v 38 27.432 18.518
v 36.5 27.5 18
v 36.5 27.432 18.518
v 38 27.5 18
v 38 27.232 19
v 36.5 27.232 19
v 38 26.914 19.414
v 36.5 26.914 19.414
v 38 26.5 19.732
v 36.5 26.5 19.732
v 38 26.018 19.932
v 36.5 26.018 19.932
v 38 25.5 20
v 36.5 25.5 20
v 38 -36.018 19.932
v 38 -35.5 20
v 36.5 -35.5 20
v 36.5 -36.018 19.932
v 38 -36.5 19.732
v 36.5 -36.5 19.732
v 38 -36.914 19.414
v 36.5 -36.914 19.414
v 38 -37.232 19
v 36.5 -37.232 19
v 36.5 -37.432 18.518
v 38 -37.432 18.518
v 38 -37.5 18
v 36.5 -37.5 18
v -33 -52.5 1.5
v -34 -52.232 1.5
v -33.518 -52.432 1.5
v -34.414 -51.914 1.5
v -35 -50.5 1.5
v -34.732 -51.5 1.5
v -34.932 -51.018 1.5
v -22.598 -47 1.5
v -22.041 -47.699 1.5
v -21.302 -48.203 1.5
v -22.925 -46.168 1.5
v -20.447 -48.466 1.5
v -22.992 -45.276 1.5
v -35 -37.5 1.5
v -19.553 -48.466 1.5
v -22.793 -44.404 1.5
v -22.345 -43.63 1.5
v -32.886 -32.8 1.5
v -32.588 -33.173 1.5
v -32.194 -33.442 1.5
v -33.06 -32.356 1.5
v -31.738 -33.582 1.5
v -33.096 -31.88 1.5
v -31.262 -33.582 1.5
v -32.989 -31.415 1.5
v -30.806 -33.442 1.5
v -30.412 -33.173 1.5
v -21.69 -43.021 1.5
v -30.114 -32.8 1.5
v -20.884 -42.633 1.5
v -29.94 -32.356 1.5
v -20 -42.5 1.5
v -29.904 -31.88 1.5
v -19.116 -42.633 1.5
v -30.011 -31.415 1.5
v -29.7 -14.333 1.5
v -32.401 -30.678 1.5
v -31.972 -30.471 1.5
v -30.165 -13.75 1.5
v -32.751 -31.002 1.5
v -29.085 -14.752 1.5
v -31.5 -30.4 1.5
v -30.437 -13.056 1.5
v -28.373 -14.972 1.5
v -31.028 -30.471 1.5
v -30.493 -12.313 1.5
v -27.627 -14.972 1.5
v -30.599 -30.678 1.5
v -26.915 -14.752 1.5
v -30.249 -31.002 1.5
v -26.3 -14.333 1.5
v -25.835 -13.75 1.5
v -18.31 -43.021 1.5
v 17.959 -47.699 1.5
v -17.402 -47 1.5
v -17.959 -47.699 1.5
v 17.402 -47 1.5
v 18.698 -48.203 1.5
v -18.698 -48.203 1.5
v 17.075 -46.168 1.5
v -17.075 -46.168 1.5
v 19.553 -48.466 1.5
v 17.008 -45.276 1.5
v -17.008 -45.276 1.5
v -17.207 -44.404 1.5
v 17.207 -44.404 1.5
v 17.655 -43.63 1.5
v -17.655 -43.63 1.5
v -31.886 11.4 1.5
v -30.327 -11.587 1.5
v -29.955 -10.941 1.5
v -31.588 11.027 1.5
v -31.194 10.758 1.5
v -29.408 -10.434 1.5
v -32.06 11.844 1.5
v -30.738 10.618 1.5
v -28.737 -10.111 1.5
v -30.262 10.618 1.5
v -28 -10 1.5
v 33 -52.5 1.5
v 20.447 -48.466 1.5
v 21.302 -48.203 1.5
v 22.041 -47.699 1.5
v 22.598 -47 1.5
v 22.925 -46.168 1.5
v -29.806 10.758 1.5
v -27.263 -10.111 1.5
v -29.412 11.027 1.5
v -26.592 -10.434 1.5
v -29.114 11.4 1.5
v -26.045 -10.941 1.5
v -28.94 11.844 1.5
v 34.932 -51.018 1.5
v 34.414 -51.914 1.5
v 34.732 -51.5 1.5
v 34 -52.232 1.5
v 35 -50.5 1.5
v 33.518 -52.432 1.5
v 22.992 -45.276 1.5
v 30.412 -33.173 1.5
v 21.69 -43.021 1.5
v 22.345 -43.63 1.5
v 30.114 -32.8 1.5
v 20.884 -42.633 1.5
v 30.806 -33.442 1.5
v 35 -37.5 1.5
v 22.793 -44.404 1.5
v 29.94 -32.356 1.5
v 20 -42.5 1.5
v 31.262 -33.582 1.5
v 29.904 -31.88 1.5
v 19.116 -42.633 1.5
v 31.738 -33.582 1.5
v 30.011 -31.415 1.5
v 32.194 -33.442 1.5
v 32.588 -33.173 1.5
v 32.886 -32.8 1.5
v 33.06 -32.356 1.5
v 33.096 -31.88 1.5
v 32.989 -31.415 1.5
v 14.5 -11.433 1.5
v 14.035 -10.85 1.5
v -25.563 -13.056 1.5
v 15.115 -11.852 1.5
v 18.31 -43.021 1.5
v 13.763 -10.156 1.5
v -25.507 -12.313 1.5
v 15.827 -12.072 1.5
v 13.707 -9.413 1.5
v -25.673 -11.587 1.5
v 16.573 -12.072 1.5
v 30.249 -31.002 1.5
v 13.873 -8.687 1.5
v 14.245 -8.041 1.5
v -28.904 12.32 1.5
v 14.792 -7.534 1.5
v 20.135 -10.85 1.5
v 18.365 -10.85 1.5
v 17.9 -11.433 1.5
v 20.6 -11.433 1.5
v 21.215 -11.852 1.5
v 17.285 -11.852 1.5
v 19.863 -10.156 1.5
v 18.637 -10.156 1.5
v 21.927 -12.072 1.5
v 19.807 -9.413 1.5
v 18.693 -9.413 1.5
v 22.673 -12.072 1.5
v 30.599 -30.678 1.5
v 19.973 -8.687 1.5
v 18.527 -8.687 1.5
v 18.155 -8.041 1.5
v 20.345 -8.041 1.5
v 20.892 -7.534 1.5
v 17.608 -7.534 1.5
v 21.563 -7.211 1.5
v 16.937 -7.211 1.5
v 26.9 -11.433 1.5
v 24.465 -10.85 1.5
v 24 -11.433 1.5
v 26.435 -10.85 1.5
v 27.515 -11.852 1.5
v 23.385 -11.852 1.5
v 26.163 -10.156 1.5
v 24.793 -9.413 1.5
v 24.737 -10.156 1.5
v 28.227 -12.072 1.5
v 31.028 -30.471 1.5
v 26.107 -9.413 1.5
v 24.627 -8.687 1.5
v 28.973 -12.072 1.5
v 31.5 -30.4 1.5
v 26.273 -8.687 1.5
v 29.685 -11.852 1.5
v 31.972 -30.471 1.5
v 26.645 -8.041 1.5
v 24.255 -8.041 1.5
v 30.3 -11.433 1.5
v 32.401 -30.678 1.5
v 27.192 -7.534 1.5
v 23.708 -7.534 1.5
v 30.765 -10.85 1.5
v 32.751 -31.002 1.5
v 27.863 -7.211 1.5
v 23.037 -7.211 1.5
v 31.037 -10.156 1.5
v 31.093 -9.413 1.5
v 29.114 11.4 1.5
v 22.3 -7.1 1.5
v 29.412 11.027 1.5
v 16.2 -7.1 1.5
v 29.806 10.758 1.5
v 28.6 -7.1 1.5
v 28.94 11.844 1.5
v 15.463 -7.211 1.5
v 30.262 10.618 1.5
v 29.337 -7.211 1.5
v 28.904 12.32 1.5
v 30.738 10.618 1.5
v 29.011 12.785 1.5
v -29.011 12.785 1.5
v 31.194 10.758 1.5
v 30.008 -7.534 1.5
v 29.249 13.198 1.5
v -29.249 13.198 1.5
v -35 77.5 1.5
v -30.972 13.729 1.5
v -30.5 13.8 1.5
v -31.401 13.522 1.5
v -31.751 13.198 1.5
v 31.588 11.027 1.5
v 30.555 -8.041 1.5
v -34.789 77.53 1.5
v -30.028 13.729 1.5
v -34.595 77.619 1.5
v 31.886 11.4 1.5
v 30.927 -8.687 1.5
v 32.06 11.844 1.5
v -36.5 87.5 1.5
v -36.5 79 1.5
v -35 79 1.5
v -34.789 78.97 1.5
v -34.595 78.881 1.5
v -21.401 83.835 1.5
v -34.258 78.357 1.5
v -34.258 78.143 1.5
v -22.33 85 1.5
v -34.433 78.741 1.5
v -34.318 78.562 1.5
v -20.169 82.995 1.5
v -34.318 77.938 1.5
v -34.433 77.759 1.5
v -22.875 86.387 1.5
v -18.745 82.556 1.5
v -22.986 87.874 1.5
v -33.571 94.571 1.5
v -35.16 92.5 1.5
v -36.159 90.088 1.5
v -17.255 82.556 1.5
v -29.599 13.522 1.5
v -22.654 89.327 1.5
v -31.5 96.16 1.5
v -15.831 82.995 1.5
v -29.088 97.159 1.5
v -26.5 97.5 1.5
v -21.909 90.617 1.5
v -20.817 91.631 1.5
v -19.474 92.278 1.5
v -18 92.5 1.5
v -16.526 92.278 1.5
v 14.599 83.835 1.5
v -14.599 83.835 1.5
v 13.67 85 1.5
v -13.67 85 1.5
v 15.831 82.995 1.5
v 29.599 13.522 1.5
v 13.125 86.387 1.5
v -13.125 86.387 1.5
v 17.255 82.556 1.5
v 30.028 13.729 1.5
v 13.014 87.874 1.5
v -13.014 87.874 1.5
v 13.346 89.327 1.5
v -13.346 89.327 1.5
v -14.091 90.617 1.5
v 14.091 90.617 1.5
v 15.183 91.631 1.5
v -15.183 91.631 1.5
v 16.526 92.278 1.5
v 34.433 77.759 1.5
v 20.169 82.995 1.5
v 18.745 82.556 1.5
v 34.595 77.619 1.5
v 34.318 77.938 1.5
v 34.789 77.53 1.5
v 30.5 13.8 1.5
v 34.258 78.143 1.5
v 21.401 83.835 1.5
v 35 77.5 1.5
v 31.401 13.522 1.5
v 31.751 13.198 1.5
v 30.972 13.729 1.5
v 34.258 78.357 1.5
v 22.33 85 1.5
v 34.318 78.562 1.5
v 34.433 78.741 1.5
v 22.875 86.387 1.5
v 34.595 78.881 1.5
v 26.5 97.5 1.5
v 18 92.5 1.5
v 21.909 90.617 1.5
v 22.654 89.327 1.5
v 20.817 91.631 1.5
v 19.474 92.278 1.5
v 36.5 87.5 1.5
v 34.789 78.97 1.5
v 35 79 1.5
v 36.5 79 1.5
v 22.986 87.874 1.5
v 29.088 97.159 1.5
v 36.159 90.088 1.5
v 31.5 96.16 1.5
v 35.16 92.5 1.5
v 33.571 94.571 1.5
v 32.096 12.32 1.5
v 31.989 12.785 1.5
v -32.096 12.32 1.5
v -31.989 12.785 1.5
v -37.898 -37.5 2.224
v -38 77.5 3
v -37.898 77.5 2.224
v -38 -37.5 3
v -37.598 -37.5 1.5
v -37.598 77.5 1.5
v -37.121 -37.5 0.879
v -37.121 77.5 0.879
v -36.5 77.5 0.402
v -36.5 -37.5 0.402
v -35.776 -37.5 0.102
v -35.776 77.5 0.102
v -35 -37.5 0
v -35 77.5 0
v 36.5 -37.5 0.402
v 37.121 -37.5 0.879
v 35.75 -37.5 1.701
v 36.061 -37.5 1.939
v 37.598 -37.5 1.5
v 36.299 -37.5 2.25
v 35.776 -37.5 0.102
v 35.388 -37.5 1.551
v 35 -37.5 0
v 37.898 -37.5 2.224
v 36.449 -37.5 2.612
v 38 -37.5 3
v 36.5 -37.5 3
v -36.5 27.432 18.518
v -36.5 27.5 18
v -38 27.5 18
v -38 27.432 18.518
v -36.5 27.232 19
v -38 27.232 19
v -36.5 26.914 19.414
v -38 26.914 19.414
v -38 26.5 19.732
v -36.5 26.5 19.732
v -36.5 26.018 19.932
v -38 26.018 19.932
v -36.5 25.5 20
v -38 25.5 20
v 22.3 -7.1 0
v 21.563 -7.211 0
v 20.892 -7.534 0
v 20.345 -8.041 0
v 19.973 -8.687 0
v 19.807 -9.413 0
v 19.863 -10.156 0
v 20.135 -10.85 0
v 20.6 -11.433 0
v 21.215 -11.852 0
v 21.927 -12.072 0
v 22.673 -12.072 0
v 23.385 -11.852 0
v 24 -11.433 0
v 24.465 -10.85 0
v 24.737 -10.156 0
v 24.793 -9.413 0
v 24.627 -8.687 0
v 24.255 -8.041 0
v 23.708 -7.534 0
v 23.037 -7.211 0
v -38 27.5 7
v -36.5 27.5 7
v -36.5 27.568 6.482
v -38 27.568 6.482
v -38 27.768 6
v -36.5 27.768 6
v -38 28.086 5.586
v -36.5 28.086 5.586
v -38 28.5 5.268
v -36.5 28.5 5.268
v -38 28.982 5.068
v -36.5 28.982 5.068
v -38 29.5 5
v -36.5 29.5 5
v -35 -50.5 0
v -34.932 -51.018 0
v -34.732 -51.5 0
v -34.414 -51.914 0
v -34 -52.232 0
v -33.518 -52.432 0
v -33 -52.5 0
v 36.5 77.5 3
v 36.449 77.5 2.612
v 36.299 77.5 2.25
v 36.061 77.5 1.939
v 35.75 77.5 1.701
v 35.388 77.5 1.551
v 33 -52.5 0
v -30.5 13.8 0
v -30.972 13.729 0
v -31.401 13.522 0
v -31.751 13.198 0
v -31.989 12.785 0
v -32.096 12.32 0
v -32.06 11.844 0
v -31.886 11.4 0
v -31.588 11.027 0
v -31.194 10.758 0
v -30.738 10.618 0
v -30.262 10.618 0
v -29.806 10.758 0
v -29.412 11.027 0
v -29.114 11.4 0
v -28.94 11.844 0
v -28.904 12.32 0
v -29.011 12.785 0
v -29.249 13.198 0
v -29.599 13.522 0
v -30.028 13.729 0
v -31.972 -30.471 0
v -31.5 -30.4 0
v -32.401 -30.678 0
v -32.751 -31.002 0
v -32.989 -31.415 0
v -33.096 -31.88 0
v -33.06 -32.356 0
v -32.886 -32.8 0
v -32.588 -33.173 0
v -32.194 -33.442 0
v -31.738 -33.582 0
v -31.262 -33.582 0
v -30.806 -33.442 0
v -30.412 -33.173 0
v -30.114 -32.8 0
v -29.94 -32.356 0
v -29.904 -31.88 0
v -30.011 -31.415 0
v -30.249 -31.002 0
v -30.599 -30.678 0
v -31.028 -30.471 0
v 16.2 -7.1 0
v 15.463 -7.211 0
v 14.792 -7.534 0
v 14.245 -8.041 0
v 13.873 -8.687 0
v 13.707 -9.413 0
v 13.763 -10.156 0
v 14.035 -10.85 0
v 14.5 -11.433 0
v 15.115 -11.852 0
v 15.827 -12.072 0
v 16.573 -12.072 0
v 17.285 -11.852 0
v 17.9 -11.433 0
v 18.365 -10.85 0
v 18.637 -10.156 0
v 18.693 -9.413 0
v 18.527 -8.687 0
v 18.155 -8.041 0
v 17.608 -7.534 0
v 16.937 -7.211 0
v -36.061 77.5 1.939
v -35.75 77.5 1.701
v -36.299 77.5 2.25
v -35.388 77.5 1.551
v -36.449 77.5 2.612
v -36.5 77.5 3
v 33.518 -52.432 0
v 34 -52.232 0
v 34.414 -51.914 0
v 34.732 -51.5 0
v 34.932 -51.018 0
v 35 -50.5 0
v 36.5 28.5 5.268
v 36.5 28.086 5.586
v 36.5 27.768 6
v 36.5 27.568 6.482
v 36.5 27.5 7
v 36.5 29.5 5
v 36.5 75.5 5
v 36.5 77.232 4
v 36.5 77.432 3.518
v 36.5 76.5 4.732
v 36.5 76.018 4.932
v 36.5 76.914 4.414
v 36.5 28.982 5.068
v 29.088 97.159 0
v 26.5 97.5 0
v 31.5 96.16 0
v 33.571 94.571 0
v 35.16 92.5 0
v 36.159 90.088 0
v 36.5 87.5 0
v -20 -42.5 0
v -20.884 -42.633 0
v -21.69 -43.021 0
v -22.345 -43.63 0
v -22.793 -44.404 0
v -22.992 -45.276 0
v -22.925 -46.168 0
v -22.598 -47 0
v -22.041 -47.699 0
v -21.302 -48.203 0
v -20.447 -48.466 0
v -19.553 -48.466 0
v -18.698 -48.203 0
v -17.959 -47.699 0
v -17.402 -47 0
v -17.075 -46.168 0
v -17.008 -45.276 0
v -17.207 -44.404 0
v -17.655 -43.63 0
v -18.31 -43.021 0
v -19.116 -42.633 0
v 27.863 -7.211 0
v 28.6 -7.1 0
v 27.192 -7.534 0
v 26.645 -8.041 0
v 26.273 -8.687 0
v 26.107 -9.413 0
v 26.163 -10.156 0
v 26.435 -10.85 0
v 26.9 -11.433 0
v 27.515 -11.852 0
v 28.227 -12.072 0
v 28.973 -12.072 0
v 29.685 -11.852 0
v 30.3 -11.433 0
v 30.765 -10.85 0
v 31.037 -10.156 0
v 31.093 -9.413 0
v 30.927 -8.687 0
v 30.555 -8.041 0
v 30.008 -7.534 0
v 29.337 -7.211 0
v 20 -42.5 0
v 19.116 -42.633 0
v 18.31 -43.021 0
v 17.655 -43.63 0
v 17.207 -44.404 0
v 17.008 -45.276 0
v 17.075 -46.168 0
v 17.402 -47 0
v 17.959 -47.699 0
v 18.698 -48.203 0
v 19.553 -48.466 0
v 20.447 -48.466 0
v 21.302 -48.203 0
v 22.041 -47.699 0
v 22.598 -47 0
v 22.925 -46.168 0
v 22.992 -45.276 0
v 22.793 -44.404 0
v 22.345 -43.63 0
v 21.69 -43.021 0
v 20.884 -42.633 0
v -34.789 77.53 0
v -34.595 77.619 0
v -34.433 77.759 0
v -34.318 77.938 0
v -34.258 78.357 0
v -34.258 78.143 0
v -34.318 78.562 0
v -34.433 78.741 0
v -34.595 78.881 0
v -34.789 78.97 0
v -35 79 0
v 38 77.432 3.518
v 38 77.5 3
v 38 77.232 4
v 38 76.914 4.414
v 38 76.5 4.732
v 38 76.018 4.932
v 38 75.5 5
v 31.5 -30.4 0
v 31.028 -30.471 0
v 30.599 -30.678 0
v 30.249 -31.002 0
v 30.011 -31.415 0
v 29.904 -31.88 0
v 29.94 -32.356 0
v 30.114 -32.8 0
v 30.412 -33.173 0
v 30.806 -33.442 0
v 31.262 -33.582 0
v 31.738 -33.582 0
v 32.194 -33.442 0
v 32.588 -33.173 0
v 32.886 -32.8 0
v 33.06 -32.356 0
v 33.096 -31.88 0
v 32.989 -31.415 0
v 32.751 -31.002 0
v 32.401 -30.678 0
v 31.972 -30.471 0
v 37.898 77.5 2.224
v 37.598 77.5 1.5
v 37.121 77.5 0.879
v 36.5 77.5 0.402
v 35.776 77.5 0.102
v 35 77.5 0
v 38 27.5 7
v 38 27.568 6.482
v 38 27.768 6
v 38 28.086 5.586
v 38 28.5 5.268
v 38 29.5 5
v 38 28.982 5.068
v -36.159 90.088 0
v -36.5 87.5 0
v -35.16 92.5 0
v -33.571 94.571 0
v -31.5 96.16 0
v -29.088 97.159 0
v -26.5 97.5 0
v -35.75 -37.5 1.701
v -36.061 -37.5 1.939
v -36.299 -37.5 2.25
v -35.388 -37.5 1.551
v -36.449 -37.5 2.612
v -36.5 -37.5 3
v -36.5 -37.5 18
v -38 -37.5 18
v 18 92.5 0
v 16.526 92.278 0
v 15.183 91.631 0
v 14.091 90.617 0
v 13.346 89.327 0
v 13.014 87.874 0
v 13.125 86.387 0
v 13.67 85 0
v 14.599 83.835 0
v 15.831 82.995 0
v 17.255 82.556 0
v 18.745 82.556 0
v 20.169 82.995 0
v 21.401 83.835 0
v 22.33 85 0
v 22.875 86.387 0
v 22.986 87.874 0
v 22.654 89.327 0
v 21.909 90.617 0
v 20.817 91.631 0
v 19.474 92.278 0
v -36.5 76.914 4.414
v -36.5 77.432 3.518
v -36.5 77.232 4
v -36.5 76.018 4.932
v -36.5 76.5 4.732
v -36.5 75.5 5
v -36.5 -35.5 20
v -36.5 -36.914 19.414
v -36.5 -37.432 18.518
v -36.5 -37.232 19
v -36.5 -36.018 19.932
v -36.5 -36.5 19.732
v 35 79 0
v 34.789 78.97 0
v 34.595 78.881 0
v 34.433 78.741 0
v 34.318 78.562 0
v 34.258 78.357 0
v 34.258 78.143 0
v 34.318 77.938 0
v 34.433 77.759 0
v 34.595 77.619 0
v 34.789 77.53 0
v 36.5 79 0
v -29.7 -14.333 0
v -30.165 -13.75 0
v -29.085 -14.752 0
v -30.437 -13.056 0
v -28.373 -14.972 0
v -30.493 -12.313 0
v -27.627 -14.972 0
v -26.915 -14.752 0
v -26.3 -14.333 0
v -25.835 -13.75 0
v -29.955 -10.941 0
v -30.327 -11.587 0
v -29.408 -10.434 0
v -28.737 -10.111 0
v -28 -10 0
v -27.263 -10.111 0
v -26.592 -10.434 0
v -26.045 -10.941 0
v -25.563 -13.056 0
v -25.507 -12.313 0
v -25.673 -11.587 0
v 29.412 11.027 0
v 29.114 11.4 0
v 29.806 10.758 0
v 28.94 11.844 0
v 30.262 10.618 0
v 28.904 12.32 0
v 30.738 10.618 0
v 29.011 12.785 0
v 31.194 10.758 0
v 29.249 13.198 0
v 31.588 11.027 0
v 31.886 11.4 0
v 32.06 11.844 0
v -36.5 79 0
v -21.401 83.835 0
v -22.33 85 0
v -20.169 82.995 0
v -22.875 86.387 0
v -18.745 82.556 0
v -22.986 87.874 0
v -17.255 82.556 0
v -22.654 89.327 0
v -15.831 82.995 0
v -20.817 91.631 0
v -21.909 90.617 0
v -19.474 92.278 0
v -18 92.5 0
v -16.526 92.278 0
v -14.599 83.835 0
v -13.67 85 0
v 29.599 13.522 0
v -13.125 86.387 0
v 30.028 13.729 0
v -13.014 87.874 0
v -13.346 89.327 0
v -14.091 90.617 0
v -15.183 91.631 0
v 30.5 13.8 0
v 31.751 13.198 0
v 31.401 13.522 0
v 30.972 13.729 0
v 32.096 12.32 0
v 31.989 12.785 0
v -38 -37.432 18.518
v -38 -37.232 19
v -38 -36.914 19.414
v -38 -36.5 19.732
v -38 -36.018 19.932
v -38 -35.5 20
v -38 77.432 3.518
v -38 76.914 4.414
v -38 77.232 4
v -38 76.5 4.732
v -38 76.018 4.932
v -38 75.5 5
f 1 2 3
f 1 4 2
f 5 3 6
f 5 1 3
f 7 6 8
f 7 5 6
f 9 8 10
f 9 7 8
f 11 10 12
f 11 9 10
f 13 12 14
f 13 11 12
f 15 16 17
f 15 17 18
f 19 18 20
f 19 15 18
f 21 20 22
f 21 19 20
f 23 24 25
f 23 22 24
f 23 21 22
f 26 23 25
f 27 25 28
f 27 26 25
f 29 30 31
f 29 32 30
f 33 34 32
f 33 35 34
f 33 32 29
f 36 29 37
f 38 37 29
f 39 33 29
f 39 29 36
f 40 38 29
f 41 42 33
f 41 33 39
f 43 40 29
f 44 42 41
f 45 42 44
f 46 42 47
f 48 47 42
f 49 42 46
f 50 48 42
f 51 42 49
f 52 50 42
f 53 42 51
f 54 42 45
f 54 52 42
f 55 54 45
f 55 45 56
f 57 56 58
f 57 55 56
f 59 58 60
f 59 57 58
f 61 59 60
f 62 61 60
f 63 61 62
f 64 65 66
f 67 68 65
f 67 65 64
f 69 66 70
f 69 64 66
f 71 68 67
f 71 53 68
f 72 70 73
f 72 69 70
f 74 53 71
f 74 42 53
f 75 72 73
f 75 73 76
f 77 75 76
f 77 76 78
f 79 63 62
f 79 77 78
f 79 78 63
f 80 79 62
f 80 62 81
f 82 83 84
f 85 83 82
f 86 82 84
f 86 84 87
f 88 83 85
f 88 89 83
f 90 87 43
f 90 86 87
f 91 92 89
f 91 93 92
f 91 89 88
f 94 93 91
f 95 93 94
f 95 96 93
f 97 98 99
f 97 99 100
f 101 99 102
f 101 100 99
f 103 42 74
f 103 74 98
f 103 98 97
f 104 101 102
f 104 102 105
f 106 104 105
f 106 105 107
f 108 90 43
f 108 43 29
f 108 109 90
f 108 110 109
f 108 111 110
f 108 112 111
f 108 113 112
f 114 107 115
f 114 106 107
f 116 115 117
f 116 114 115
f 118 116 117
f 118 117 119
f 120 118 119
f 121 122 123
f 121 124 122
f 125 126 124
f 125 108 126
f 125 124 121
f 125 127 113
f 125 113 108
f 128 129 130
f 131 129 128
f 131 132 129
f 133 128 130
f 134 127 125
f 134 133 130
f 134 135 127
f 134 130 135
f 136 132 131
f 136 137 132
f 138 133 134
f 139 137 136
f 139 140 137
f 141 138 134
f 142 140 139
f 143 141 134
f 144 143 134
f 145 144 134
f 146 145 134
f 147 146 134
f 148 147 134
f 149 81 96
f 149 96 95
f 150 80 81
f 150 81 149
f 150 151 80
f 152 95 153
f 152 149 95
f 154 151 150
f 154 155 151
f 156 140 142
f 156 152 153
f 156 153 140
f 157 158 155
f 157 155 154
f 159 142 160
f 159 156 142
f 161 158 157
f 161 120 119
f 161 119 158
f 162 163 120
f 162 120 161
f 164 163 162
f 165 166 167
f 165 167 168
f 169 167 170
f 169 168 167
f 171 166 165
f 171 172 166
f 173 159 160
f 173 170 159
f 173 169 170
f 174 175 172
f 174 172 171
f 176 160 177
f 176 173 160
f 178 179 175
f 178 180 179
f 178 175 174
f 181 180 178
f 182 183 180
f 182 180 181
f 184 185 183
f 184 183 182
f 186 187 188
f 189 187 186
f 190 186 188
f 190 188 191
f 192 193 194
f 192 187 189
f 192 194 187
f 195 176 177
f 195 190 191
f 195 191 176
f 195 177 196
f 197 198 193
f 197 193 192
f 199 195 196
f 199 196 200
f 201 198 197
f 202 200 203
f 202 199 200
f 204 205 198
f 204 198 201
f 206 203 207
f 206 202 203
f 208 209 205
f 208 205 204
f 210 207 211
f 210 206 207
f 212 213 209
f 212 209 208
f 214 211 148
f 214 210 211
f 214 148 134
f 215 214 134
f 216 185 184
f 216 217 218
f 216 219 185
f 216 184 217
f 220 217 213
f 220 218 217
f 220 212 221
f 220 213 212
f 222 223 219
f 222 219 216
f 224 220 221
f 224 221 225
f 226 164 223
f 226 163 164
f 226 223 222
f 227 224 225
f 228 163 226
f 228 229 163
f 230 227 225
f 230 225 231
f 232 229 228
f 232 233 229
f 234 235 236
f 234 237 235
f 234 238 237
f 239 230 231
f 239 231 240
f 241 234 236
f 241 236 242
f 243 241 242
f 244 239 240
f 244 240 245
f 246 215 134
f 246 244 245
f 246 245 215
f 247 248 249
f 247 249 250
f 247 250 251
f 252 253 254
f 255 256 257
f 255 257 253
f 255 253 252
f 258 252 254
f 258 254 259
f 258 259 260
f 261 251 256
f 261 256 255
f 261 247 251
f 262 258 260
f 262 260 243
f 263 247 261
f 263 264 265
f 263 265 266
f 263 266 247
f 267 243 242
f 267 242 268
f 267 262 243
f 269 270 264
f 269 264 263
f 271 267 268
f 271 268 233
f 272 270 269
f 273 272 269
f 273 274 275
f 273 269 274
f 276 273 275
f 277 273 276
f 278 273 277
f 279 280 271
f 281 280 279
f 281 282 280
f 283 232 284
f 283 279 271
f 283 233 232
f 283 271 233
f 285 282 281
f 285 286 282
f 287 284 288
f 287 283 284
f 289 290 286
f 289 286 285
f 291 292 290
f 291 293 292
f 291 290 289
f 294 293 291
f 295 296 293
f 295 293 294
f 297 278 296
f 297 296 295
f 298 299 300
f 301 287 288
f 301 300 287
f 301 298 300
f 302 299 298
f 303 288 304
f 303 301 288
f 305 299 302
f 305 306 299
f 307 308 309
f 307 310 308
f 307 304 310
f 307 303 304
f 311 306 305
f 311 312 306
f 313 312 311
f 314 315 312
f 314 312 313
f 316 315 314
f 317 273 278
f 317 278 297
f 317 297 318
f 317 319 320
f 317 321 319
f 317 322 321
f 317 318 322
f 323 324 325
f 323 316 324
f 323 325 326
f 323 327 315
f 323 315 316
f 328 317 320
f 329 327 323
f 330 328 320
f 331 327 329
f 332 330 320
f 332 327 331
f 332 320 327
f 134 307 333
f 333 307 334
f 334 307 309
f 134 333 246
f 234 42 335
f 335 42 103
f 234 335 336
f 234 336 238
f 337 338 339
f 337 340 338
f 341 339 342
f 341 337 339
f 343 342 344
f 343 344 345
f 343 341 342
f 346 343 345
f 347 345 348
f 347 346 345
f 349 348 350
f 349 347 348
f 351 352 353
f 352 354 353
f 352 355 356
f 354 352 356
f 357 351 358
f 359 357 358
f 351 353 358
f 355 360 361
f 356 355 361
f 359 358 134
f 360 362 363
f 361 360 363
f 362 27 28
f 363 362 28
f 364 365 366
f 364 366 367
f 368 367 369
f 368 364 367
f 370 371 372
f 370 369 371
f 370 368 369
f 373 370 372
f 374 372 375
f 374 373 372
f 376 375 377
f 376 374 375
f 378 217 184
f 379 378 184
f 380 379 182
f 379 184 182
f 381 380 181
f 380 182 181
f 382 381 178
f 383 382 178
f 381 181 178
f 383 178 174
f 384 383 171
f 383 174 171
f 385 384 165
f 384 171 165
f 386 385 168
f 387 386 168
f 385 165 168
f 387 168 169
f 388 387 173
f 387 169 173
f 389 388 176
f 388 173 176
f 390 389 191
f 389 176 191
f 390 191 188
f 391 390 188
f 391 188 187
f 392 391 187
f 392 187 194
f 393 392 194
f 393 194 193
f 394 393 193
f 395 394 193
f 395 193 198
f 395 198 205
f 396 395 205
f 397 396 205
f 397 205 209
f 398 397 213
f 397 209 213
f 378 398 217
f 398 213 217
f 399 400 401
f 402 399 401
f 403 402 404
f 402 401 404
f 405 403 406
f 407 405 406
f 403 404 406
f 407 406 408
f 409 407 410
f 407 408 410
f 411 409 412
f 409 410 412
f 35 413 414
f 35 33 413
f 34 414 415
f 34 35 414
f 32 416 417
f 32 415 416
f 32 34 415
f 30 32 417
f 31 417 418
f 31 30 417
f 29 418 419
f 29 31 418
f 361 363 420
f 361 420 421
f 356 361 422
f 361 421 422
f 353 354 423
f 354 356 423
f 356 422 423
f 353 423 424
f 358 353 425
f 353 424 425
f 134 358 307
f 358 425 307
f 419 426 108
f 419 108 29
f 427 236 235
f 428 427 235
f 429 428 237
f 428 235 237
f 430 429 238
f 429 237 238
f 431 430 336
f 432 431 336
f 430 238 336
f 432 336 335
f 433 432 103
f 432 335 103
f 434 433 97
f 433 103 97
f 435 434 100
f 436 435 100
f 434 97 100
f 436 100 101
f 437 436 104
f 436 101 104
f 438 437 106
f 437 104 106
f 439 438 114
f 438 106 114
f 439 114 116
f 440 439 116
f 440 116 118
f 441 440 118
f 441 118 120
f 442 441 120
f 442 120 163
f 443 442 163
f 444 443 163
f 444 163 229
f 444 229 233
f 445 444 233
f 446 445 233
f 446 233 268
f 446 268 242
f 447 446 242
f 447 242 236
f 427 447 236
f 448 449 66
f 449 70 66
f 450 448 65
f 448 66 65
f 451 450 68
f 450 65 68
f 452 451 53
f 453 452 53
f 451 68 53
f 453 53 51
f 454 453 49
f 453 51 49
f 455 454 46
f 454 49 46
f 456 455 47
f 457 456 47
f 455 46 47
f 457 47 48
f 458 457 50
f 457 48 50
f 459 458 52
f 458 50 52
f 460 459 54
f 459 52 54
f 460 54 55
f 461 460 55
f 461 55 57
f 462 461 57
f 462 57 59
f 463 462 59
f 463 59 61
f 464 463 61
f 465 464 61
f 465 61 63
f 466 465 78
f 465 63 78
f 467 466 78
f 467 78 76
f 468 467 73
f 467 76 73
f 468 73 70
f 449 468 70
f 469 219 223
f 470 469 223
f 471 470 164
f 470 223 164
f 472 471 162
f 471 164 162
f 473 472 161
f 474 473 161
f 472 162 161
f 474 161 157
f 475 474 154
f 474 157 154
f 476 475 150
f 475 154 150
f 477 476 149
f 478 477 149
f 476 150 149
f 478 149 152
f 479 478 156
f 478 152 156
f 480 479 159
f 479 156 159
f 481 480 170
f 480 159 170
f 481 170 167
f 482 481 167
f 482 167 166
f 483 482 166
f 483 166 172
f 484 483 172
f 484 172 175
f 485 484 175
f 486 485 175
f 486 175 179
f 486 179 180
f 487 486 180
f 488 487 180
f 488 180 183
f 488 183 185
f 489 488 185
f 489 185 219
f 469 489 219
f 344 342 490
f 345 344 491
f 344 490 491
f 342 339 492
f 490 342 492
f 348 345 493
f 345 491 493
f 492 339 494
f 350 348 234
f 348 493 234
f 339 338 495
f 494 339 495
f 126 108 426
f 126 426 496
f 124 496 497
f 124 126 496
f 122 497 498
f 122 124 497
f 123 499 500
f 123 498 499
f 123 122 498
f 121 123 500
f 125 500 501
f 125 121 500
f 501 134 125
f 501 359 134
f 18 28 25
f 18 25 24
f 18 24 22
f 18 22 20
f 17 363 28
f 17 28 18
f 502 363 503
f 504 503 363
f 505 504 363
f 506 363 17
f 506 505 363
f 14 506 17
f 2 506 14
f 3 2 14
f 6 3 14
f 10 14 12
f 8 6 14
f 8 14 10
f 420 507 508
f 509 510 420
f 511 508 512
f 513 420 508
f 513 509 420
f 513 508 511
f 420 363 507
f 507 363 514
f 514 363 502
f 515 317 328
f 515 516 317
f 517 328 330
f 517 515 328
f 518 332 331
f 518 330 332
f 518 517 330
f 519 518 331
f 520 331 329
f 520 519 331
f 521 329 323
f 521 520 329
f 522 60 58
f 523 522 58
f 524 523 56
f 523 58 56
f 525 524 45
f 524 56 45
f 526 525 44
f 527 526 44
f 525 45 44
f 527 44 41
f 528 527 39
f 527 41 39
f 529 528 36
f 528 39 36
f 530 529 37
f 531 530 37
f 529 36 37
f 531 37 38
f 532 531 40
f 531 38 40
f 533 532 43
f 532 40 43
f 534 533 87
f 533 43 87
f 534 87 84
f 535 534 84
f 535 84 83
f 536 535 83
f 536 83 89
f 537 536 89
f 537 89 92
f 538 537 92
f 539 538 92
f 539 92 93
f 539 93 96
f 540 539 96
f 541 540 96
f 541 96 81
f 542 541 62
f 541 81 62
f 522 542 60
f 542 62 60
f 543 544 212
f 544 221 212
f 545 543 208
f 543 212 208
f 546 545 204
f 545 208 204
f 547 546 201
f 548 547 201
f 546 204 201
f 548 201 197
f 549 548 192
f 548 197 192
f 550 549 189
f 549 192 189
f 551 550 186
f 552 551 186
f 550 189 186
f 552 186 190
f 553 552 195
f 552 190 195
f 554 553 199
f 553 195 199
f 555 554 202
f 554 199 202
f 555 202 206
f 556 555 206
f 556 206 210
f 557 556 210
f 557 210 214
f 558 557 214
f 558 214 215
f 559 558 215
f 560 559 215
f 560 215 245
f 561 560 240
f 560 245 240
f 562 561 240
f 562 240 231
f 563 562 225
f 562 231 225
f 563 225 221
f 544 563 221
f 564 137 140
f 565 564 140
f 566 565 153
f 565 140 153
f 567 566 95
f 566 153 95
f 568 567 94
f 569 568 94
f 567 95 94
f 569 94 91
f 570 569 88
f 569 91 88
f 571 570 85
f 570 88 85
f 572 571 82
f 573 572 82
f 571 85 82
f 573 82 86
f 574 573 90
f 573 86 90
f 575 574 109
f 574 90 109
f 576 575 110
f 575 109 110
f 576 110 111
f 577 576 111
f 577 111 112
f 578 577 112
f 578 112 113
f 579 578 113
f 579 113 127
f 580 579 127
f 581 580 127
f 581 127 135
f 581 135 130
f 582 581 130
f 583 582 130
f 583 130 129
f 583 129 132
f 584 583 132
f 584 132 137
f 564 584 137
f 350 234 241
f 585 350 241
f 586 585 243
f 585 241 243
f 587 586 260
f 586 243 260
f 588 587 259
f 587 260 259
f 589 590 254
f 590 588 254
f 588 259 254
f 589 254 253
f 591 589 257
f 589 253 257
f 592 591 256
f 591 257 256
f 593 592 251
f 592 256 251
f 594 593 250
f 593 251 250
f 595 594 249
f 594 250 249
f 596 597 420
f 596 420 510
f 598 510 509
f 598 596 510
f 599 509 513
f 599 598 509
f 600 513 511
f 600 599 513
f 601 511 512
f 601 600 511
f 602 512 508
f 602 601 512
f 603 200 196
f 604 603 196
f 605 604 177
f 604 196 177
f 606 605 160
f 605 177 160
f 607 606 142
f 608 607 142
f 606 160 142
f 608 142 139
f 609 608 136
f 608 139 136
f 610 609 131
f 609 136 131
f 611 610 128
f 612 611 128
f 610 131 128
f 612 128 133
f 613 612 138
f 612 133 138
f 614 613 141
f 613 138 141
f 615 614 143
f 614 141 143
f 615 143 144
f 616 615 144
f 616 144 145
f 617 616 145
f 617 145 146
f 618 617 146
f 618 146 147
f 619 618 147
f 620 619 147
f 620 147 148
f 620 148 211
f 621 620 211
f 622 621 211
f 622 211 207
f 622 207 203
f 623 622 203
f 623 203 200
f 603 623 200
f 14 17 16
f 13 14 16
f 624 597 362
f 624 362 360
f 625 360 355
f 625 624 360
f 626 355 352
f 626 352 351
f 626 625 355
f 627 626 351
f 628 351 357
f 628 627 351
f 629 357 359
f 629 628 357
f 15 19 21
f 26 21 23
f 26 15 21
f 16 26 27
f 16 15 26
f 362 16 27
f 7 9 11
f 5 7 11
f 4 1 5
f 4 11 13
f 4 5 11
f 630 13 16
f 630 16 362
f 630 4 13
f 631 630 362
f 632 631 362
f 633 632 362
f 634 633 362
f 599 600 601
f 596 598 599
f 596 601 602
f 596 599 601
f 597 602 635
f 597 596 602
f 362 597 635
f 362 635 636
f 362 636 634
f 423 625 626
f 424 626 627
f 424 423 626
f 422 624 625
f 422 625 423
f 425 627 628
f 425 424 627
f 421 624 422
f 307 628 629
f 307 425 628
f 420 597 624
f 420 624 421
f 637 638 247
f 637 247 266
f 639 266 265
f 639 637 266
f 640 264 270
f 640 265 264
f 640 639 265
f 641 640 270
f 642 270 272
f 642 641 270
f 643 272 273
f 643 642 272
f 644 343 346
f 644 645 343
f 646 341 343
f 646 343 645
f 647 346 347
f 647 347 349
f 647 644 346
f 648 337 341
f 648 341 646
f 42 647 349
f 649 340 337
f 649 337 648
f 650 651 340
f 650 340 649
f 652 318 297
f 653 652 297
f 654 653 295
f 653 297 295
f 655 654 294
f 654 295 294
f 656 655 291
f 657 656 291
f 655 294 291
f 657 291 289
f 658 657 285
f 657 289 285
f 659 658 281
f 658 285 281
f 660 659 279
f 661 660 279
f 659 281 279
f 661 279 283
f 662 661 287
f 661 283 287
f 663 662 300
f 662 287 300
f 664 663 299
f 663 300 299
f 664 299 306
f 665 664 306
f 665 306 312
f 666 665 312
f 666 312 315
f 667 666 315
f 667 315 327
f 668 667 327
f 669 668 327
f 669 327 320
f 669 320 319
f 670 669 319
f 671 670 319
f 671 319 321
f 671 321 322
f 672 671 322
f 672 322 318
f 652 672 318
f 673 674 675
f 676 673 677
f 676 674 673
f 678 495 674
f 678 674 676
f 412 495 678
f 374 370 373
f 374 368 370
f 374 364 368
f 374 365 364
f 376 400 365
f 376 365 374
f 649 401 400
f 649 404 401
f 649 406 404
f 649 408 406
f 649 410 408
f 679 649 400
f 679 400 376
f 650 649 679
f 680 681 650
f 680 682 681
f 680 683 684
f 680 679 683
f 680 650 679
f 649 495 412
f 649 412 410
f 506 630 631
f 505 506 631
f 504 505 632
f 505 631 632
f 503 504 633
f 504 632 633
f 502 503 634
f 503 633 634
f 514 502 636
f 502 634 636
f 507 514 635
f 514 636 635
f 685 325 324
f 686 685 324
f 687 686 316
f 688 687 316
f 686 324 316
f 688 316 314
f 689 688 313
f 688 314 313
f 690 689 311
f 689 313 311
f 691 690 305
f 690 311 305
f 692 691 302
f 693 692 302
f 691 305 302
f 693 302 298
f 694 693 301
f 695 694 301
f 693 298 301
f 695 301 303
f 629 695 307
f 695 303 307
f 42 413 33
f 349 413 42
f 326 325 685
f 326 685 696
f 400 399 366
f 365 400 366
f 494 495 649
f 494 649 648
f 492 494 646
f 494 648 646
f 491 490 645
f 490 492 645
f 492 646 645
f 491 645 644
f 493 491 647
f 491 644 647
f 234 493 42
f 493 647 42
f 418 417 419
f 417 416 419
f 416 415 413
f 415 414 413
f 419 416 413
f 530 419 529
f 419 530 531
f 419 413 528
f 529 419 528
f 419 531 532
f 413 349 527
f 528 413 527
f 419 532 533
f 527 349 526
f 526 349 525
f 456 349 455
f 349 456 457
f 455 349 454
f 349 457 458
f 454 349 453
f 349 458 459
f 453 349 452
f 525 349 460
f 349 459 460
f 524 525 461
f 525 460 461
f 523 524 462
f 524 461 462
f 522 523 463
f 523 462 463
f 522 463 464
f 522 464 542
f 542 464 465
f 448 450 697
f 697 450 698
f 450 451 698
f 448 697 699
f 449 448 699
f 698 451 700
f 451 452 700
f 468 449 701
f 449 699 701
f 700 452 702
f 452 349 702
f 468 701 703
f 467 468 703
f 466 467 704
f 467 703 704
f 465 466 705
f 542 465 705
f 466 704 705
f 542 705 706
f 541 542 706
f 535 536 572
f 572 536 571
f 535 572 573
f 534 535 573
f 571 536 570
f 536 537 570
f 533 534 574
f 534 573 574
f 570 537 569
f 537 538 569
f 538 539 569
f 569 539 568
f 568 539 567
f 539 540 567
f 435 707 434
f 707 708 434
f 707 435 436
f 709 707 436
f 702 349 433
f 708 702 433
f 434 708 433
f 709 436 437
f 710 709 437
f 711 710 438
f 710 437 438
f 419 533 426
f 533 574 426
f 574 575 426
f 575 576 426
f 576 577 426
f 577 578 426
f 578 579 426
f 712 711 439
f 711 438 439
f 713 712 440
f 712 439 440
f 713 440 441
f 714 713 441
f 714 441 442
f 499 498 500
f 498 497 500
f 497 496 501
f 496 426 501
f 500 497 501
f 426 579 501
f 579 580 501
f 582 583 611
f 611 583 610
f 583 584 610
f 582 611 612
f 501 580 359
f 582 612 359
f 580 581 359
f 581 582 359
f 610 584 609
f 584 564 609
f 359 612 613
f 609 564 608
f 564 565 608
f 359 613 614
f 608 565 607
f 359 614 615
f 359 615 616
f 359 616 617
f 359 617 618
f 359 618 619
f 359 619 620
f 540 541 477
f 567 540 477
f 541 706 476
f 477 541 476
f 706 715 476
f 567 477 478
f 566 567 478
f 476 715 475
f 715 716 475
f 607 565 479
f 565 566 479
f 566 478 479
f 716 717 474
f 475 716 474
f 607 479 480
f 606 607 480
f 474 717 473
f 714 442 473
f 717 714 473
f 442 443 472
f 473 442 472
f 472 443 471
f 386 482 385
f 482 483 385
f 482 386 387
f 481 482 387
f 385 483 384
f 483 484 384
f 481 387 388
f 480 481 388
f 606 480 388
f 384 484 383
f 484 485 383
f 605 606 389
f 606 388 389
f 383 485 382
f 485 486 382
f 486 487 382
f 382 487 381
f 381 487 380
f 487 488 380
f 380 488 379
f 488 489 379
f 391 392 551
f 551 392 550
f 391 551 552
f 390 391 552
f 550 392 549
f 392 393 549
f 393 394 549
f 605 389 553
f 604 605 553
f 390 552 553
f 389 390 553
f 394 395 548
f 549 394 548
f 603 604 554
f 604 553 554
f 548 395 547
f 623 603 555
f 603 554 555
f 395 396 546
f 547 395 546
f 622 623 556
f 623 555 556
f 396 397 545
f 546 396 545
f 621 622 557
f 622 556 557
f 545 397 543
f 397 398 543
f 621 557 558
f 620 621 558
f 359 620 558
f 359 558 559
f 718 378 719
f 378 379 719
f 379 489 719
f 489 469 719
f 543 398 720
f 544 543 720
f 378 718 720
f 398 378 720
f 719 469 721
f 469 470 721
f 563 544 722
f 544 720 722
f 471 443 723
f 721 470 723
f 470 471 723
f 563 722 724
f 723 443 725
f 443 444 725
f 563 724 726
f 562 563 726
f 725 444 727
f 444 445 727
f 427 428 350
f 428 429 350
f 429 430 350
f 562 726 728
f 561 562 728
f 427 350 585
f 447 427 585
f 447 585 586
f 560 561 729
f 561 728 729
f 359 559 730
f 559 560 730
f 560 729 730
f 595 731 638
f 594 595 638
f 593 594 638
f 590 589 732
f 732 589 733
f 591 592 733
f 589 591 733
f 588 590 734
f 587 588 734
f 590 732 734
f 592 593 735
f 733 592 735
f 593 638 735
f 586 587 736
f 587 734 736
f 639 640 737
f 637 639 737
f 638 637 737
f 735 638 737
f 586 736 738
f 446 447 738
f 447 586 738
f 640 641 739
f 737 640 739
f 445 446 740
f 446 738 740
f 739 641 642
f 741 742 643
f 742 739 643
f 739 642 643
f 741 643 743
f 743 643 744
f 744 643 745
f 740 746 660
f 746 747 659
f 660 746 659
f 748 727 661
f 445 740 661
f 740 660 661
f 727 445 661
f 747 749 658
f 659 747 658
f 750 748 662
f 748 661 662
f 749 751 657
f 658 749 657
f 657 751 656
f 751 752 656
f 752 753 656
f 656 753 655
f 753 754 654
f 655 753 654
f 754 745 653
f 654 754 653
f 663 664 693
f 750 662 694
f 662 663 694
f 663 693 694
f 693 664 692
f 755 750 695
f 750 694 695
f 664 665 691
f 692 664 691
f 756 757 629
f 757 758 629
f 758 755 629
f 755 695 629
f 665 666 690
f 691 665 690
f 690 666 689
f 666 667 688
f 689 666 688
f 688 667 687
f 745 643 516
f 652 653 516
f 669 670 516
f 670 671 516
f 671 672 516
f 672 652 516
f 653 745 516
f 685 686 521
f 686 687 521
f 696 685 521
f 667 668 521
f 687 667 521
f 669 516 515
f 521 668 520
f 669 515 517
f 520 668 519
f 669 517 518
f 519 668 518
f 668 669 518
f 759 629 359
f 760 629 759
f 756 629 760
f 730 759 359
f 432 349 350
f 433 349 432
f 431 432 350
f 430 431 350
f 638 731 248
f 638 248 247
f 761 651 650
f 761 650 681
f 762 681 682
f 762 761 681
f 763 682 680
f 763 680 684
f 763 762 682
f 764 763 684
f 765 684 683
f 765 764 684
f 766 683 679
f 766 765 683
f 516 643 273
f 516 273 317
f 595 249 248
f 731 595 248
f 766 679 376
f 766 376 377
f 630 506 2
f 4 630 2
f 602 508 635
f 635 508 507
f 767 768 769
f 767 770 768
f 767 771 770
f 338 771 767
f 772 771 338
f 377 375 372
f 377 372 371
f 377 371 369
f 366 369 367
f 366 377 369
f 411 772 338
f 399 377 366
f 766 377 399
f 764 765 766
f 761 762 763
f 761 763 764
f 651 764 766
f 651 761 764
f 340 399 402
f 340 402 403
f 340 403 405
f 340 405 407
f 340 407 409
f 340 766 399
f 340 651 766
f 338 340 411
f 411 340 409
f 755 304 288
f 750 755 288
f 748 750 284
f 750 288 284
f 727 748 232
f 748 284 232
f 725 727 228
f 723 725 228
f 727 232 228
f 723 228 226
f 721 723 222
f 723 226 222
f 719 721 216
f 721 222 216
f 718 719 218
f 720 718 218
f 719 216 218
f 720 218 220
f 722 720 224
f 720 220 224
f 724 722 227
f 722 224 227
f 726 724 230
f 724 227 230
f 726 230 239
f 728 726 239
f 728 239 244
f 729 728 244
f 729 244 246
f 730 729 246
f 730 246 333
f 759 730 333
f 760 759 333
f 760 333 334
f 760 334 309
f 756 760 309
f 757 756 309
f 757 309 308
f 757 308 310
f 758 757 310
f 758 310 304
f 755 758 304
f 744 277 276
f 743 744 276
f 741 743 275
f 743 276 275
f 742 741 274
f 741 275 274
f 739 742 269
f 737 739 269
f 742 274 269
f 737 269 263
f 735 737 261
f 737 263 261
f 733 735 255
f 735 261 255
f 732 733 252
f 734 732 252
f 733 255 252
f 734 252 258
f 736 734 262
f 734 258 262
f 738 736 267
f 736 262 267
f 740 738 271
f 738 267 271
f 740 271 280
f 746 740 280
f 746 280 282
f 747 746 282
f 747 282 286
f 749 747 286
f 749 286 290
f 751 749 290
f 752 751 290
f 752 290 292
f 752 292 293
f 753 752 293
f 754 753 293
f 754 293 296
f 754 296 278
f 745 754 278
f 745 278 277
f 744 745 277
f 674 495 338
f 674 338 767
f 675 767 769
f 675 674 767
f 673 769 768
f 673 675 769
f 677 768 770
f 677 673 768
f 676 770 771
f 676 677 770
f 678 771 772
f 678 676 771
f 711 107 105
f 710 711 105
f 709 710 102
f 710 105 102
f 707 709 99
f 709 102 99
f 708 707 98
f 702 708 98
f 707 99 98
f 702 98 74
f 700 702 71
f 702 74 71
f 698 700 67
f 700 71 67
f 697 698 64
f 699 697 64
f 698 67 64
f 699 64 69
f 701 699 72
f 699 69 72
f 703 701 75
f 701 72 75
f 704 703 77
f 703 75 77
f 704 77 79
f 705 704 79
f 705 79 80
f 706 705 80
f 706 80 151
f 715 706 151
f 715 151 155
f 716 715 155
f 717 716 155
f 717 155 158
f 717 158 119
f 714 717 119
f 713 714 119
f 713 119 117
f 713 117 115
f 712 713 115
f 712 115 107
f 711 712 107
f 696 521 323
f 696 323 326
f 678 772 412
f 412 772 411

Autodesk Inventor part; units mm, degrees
ref_plane "YZ Plane" through (0, 0, 0) normal (1, 0, 0) x (0, 1, 0)
ref_plane "XZ Plane" through (0, 0, 0) normal (0, 1, 0) x (-1, 0, 0)
ref_plane "XY Plane" through (0, 0, 0) normal (0, 0, 1) x (1, 0, 0)
sketch "Sketch_base" plane through (0, 0, 0) normal (0, 0, 1) x (1, 0, 0)
  line L0 (0, 129.9853) -> (0, -82.9142) construction
  line L1 (-53.9995, 0) -> (53.9995, 0) construction
  line L2 (-36.5, 37.5) -> (36.5, 37.5)
  line L3 (36.5, 37.5) -> (36.5, -37.5)
  line L4 (36.5, -37.5) -> (-36.5, -37.5)
  line L5 (-36.5, -37.5) -> (-36.5, 37.5)
  line L6 (-36.5, 37.5) -> (36.5, -37.5) construction
  line L7 (36.5, 37.5) -> (-36.5, -37.5) construction
  line L8 (-35, -37.5) -> (35, -37.5)
  line L9 (35, -37.5) -> (35, -52.5)
  line L10 (35, -52.5) -> (-35, -52.5)
  line L11 (-35, -52.5) -> (-35, -37.5)
  line L12 (-35, -37.5) -> (35, -52.5) construction
  line L13 (35, -37.5) -> (-35, -52.5) construction
  line L14 (-26.5, 97.5) -> (26.5, 97.5)
  line L15 (36.5, 87.5) -> (36.5, 37.5)
  line L16 (36.5, 37.5) -> (-36.5, 37.5)
  line L17 (-36.5, 37.5) -> (-36.5, 87.5)
  line L18 (-36.5, 97.5) -> (36.5, 37.5) construction
  line L19 (36.5, 97.5) -> (-36.5, 37.5) construction
  arc A0 (-26.5, 97.5) -> (-36.5, 87.5) centre (-26.5, 87.5) ccw
  arc A1 (36.5, 87.5) -> (26.5, 97.5) centre (26.5, 87.5) ccw
  circle A2 centre (-30.5, 12.2) radius 1.6
  circle A3 centre (30.5, 12.2) radius 1.6
  circle A4 centre (16.2, -9.6) radius 2.5
  circle A5 centre (22.3, -9.6) radius 2.5
  circle A6 centre (28.6, -9.6) radius 2.5
  circle A7 centre (-31.5, -32) radius 1.6
  circle A8 centre (31.5, -32) radius 1.6
  circle A9 centre (-28, -12.5) radius 2.5
  point P0 (0, 0)
  point P1 (-20, -45.5)
  point P2 (20, -45.5)
  point P3 (0, -45)
  point P4 (0, 67.5)
  point P5 (-18, 87.5)
  point P6 (18, 87.5)
  point P7 (31.5, -32)
  dimension "d0" = 73
  dimension "d1" = 75
  dimension "d3" = 40
  dimension "d4" = 20
  dimension "d38" = 15
  dimension "d39" = 0
  dimension "d40" = 70
  dimension "d46" = 7
  dimension "d47" = 7
  dimension "d55" = 60
  dimension "d56" = 10
  dimension "d57" = 10
  dimension "d58" = 36
  dimension "d59" = 18
  dimension "d102" = 5.5
  dimension "d103" = 5.5
  dimension "d104" = 63
  dimension "d105" = 31.5
  dimension "d113" = 10
  dimension "d114" = 10
extrude "Plate1" add sketch "Sketch_base" along normal blind 1.5 contours L2 L3 L4 L5 | A2 | A3 | A4 | A5 | A6 | A7 | A8 | A9
sheet face with bend "Face2" sketch "Sketch_base" thickness 1.5 toward (0, 0, 1) bend radius 1.5 contours L4 L9 L10 L11
bend "Bend3"
hole "Hole2" at (-20, -45.5, 0) at (20, -45.5, 0) direction (0, 0, 1) diameter 6 end through all
sheet face with bend "Face3" sketch "Sketch_base" thickness 1.5 toward (0, 0, 1) bend radius 1.5 contours L17 A0 L14 A1 L15 L2
bend "Bend4"
hole "Hole3" at (18, 87.5, 0) at (-18, 87.5, 0) direction (0, 0, 1) diameter 10 end through all
sketch "Sketch4" plane through (-36.5, -37.5, 1.5) normal (-1, 0, 0) x (0, -1, 0)
  line L0 (-115, 0) -> (0, 0)
  line L1 (0, 0) -> (0, 18.5)
  line L2 (0, 18.5) -> (-115, 18.5)
  line L3 (-115, 18.5) -> (-115, 0)
edge flange "Flange3" height 20 angle 90 thickness 1.5 bend radius 1.5 thickness toward (-1, 0, 0) relief round relief width 1.5 relief depth 0.75 edges at (-36.5, 25, 1.5) wall of the first edge with corners at (-36.5, 77.5, 1.5) (-36.5, -37.5, 1.5) (-36.5, -37.5, 20) (-36.5, 77.5, 20)
bend "Bend5"
corner "Corner3"
sketch "Sketch5" plane through (36.5, 87.5, 1.5) normal (1, 0, 0) x (0, 1, 0)
  line L0 (-125, 0) -> (-10, 0)
  line L1 (-10, 0) -> (-10, 18.5)
  line L2 (-10, 18.5) -> (-125, 18.5)
  line L3 (-125, 18.5) -> (-125, 0)
edge flange "Flange4" height 20 angle 90 thickness 1.5 bend radius 1.5 thickness toward (1, 0, 0) relief round relief width 1.5 relief depth 0.75 edges at (36.5, 25, 1.5) wall of the first edge with corners at (36.5, -37.5, 1.5) (36.5, 77.5, 1.5) (36.5, 77.5, 20) (36.5, -37.5, 20)
bend "Bend6"
corner "Corner4"
sketch "Sketch6" plane through (-38, -37.5, 20) normal (-1, 0, 0) x (0, 0, 1)
  line L0 (0, 0) -> (0, 115) projected
  line L1 (0, 115) -> (-15, 115)
  line L2 (-15, 115) -> (-15, 65)
  line L3 (-15, 65) -> (0, 65)
  line L4 (0, 65) -> (0, 115)
  point P0 (-20, 37.5)
  point P1 (0, 65)
  dimension "d96" = 15
  dimension "d97" = 50
extrude "Extrusion1" cut sketch "Sketch6" against normal through all
fillet "Fillet1" radius 2 6 edges at (-37.25, 77.5, 5) (37.25, 77.5, 5) (37.25, 27.5, 20) (37.25, 27.5, 5) (-37.25, 27.5, 5) (-37.25, 27.5, 20)
fillet "Fillet2" radius 2 2 edges at (37.25, -37.5, 20) (-37.25, -37.5, 20)
hole "Hole4" at (-31.5, -32, 0) at (31.5, -32, 0) direction (0, 0, 1) diameter 3.2 end through all
fillet "Corner Round1" radius 2 2 edges at (-35, -52.5, 0.75) (35, -52.5, 0.75)
hole "Hole5" at (-30.5, 12.2, 0) at (30.5, 12.2, 0) direction (0, 0, 1) diameter 3.2 end through all
hole "Hole6" at (16.2, -9.6, 0) at (22.3, -9.6, 0) at (28.6, -9.6, 0) at (-28, -12.5, 0) direction (0, 0, 1) diameter 5 end through all
equation "\"d4\" = 0.5 * d3"
equation "\"d47\" = d46"
equation "\"d59\" = 0.5 * d58"
equation "\"d103\" = d102"
equation "\"d105\" = 0.5 * d104"
equation "\"d114\" = d113"
equation "\"d111\" = Thickness"
equation "\"d121\" = Thickness"
equation "\"d2\" = Thickness"
equation "\"d41\" = BendRadius"
equation "\"d42\" = BendReliefWidth"
equation "\"d44\" = MinimumRemnant"
equation "\"d43\" = BendReliefDepth"
equation "\"d45\" = TransitionRadius"
equation "\"d60\" = BendRadius"
equation "\"d61\" = BendReliefWidth"
equation "\"d63\" = MinimumRemnant"
equation "\"d62\" = BendReliefDepth"
equation "\"d64\" = TransitionRadius"
equation "\"d72\" = BendReliefWidth"
equation "\"d73\" = BendReliefDepth"
equation "\"d74\" = MinimumRemnant"
equation "\"d75\" = TransitionRadius"
equation "\"d78\" = BendRadius"
equation "\"d79\" = CornerReliefSize"
equation "\"d80\" = GapSize"
equation "\"d81\" = JacobiRadiusSize"
equation "\"d84\" = BendReliefWidth"
equation "\"d85\" = BendReliefDepth"
equation "\"d86\" = MinimumRemnant"
equation "\"d87\" = TransitionRadius"
equation "\"d92\" = BendRadius"
equation "\"d93\" = CornerReliefSize"
equation "\"d94\" = GapSize"
equation "\"d95\" = JacobiRadiusSize"
equation "\"BendRadius\" = Thickness"
equation "\"BendReliefWidth\" = Thickness"
equation "\"BendReliefDepth\" = 0.5 * Thickness"
equation "\"CornerReliefSize\" = 4 * Thickness"
equation "\"MinimumRemnant\" = 2 * Thickness"
equation "\"TransitionRadius\" = BendRadius"
equation "\"JacobiRadiusSize\" = BendRadius"
equation "\"GapSize\" = Thickness"
equation "\"Thickness\" = 1.5"
properties part number "Enclosure_Base"
